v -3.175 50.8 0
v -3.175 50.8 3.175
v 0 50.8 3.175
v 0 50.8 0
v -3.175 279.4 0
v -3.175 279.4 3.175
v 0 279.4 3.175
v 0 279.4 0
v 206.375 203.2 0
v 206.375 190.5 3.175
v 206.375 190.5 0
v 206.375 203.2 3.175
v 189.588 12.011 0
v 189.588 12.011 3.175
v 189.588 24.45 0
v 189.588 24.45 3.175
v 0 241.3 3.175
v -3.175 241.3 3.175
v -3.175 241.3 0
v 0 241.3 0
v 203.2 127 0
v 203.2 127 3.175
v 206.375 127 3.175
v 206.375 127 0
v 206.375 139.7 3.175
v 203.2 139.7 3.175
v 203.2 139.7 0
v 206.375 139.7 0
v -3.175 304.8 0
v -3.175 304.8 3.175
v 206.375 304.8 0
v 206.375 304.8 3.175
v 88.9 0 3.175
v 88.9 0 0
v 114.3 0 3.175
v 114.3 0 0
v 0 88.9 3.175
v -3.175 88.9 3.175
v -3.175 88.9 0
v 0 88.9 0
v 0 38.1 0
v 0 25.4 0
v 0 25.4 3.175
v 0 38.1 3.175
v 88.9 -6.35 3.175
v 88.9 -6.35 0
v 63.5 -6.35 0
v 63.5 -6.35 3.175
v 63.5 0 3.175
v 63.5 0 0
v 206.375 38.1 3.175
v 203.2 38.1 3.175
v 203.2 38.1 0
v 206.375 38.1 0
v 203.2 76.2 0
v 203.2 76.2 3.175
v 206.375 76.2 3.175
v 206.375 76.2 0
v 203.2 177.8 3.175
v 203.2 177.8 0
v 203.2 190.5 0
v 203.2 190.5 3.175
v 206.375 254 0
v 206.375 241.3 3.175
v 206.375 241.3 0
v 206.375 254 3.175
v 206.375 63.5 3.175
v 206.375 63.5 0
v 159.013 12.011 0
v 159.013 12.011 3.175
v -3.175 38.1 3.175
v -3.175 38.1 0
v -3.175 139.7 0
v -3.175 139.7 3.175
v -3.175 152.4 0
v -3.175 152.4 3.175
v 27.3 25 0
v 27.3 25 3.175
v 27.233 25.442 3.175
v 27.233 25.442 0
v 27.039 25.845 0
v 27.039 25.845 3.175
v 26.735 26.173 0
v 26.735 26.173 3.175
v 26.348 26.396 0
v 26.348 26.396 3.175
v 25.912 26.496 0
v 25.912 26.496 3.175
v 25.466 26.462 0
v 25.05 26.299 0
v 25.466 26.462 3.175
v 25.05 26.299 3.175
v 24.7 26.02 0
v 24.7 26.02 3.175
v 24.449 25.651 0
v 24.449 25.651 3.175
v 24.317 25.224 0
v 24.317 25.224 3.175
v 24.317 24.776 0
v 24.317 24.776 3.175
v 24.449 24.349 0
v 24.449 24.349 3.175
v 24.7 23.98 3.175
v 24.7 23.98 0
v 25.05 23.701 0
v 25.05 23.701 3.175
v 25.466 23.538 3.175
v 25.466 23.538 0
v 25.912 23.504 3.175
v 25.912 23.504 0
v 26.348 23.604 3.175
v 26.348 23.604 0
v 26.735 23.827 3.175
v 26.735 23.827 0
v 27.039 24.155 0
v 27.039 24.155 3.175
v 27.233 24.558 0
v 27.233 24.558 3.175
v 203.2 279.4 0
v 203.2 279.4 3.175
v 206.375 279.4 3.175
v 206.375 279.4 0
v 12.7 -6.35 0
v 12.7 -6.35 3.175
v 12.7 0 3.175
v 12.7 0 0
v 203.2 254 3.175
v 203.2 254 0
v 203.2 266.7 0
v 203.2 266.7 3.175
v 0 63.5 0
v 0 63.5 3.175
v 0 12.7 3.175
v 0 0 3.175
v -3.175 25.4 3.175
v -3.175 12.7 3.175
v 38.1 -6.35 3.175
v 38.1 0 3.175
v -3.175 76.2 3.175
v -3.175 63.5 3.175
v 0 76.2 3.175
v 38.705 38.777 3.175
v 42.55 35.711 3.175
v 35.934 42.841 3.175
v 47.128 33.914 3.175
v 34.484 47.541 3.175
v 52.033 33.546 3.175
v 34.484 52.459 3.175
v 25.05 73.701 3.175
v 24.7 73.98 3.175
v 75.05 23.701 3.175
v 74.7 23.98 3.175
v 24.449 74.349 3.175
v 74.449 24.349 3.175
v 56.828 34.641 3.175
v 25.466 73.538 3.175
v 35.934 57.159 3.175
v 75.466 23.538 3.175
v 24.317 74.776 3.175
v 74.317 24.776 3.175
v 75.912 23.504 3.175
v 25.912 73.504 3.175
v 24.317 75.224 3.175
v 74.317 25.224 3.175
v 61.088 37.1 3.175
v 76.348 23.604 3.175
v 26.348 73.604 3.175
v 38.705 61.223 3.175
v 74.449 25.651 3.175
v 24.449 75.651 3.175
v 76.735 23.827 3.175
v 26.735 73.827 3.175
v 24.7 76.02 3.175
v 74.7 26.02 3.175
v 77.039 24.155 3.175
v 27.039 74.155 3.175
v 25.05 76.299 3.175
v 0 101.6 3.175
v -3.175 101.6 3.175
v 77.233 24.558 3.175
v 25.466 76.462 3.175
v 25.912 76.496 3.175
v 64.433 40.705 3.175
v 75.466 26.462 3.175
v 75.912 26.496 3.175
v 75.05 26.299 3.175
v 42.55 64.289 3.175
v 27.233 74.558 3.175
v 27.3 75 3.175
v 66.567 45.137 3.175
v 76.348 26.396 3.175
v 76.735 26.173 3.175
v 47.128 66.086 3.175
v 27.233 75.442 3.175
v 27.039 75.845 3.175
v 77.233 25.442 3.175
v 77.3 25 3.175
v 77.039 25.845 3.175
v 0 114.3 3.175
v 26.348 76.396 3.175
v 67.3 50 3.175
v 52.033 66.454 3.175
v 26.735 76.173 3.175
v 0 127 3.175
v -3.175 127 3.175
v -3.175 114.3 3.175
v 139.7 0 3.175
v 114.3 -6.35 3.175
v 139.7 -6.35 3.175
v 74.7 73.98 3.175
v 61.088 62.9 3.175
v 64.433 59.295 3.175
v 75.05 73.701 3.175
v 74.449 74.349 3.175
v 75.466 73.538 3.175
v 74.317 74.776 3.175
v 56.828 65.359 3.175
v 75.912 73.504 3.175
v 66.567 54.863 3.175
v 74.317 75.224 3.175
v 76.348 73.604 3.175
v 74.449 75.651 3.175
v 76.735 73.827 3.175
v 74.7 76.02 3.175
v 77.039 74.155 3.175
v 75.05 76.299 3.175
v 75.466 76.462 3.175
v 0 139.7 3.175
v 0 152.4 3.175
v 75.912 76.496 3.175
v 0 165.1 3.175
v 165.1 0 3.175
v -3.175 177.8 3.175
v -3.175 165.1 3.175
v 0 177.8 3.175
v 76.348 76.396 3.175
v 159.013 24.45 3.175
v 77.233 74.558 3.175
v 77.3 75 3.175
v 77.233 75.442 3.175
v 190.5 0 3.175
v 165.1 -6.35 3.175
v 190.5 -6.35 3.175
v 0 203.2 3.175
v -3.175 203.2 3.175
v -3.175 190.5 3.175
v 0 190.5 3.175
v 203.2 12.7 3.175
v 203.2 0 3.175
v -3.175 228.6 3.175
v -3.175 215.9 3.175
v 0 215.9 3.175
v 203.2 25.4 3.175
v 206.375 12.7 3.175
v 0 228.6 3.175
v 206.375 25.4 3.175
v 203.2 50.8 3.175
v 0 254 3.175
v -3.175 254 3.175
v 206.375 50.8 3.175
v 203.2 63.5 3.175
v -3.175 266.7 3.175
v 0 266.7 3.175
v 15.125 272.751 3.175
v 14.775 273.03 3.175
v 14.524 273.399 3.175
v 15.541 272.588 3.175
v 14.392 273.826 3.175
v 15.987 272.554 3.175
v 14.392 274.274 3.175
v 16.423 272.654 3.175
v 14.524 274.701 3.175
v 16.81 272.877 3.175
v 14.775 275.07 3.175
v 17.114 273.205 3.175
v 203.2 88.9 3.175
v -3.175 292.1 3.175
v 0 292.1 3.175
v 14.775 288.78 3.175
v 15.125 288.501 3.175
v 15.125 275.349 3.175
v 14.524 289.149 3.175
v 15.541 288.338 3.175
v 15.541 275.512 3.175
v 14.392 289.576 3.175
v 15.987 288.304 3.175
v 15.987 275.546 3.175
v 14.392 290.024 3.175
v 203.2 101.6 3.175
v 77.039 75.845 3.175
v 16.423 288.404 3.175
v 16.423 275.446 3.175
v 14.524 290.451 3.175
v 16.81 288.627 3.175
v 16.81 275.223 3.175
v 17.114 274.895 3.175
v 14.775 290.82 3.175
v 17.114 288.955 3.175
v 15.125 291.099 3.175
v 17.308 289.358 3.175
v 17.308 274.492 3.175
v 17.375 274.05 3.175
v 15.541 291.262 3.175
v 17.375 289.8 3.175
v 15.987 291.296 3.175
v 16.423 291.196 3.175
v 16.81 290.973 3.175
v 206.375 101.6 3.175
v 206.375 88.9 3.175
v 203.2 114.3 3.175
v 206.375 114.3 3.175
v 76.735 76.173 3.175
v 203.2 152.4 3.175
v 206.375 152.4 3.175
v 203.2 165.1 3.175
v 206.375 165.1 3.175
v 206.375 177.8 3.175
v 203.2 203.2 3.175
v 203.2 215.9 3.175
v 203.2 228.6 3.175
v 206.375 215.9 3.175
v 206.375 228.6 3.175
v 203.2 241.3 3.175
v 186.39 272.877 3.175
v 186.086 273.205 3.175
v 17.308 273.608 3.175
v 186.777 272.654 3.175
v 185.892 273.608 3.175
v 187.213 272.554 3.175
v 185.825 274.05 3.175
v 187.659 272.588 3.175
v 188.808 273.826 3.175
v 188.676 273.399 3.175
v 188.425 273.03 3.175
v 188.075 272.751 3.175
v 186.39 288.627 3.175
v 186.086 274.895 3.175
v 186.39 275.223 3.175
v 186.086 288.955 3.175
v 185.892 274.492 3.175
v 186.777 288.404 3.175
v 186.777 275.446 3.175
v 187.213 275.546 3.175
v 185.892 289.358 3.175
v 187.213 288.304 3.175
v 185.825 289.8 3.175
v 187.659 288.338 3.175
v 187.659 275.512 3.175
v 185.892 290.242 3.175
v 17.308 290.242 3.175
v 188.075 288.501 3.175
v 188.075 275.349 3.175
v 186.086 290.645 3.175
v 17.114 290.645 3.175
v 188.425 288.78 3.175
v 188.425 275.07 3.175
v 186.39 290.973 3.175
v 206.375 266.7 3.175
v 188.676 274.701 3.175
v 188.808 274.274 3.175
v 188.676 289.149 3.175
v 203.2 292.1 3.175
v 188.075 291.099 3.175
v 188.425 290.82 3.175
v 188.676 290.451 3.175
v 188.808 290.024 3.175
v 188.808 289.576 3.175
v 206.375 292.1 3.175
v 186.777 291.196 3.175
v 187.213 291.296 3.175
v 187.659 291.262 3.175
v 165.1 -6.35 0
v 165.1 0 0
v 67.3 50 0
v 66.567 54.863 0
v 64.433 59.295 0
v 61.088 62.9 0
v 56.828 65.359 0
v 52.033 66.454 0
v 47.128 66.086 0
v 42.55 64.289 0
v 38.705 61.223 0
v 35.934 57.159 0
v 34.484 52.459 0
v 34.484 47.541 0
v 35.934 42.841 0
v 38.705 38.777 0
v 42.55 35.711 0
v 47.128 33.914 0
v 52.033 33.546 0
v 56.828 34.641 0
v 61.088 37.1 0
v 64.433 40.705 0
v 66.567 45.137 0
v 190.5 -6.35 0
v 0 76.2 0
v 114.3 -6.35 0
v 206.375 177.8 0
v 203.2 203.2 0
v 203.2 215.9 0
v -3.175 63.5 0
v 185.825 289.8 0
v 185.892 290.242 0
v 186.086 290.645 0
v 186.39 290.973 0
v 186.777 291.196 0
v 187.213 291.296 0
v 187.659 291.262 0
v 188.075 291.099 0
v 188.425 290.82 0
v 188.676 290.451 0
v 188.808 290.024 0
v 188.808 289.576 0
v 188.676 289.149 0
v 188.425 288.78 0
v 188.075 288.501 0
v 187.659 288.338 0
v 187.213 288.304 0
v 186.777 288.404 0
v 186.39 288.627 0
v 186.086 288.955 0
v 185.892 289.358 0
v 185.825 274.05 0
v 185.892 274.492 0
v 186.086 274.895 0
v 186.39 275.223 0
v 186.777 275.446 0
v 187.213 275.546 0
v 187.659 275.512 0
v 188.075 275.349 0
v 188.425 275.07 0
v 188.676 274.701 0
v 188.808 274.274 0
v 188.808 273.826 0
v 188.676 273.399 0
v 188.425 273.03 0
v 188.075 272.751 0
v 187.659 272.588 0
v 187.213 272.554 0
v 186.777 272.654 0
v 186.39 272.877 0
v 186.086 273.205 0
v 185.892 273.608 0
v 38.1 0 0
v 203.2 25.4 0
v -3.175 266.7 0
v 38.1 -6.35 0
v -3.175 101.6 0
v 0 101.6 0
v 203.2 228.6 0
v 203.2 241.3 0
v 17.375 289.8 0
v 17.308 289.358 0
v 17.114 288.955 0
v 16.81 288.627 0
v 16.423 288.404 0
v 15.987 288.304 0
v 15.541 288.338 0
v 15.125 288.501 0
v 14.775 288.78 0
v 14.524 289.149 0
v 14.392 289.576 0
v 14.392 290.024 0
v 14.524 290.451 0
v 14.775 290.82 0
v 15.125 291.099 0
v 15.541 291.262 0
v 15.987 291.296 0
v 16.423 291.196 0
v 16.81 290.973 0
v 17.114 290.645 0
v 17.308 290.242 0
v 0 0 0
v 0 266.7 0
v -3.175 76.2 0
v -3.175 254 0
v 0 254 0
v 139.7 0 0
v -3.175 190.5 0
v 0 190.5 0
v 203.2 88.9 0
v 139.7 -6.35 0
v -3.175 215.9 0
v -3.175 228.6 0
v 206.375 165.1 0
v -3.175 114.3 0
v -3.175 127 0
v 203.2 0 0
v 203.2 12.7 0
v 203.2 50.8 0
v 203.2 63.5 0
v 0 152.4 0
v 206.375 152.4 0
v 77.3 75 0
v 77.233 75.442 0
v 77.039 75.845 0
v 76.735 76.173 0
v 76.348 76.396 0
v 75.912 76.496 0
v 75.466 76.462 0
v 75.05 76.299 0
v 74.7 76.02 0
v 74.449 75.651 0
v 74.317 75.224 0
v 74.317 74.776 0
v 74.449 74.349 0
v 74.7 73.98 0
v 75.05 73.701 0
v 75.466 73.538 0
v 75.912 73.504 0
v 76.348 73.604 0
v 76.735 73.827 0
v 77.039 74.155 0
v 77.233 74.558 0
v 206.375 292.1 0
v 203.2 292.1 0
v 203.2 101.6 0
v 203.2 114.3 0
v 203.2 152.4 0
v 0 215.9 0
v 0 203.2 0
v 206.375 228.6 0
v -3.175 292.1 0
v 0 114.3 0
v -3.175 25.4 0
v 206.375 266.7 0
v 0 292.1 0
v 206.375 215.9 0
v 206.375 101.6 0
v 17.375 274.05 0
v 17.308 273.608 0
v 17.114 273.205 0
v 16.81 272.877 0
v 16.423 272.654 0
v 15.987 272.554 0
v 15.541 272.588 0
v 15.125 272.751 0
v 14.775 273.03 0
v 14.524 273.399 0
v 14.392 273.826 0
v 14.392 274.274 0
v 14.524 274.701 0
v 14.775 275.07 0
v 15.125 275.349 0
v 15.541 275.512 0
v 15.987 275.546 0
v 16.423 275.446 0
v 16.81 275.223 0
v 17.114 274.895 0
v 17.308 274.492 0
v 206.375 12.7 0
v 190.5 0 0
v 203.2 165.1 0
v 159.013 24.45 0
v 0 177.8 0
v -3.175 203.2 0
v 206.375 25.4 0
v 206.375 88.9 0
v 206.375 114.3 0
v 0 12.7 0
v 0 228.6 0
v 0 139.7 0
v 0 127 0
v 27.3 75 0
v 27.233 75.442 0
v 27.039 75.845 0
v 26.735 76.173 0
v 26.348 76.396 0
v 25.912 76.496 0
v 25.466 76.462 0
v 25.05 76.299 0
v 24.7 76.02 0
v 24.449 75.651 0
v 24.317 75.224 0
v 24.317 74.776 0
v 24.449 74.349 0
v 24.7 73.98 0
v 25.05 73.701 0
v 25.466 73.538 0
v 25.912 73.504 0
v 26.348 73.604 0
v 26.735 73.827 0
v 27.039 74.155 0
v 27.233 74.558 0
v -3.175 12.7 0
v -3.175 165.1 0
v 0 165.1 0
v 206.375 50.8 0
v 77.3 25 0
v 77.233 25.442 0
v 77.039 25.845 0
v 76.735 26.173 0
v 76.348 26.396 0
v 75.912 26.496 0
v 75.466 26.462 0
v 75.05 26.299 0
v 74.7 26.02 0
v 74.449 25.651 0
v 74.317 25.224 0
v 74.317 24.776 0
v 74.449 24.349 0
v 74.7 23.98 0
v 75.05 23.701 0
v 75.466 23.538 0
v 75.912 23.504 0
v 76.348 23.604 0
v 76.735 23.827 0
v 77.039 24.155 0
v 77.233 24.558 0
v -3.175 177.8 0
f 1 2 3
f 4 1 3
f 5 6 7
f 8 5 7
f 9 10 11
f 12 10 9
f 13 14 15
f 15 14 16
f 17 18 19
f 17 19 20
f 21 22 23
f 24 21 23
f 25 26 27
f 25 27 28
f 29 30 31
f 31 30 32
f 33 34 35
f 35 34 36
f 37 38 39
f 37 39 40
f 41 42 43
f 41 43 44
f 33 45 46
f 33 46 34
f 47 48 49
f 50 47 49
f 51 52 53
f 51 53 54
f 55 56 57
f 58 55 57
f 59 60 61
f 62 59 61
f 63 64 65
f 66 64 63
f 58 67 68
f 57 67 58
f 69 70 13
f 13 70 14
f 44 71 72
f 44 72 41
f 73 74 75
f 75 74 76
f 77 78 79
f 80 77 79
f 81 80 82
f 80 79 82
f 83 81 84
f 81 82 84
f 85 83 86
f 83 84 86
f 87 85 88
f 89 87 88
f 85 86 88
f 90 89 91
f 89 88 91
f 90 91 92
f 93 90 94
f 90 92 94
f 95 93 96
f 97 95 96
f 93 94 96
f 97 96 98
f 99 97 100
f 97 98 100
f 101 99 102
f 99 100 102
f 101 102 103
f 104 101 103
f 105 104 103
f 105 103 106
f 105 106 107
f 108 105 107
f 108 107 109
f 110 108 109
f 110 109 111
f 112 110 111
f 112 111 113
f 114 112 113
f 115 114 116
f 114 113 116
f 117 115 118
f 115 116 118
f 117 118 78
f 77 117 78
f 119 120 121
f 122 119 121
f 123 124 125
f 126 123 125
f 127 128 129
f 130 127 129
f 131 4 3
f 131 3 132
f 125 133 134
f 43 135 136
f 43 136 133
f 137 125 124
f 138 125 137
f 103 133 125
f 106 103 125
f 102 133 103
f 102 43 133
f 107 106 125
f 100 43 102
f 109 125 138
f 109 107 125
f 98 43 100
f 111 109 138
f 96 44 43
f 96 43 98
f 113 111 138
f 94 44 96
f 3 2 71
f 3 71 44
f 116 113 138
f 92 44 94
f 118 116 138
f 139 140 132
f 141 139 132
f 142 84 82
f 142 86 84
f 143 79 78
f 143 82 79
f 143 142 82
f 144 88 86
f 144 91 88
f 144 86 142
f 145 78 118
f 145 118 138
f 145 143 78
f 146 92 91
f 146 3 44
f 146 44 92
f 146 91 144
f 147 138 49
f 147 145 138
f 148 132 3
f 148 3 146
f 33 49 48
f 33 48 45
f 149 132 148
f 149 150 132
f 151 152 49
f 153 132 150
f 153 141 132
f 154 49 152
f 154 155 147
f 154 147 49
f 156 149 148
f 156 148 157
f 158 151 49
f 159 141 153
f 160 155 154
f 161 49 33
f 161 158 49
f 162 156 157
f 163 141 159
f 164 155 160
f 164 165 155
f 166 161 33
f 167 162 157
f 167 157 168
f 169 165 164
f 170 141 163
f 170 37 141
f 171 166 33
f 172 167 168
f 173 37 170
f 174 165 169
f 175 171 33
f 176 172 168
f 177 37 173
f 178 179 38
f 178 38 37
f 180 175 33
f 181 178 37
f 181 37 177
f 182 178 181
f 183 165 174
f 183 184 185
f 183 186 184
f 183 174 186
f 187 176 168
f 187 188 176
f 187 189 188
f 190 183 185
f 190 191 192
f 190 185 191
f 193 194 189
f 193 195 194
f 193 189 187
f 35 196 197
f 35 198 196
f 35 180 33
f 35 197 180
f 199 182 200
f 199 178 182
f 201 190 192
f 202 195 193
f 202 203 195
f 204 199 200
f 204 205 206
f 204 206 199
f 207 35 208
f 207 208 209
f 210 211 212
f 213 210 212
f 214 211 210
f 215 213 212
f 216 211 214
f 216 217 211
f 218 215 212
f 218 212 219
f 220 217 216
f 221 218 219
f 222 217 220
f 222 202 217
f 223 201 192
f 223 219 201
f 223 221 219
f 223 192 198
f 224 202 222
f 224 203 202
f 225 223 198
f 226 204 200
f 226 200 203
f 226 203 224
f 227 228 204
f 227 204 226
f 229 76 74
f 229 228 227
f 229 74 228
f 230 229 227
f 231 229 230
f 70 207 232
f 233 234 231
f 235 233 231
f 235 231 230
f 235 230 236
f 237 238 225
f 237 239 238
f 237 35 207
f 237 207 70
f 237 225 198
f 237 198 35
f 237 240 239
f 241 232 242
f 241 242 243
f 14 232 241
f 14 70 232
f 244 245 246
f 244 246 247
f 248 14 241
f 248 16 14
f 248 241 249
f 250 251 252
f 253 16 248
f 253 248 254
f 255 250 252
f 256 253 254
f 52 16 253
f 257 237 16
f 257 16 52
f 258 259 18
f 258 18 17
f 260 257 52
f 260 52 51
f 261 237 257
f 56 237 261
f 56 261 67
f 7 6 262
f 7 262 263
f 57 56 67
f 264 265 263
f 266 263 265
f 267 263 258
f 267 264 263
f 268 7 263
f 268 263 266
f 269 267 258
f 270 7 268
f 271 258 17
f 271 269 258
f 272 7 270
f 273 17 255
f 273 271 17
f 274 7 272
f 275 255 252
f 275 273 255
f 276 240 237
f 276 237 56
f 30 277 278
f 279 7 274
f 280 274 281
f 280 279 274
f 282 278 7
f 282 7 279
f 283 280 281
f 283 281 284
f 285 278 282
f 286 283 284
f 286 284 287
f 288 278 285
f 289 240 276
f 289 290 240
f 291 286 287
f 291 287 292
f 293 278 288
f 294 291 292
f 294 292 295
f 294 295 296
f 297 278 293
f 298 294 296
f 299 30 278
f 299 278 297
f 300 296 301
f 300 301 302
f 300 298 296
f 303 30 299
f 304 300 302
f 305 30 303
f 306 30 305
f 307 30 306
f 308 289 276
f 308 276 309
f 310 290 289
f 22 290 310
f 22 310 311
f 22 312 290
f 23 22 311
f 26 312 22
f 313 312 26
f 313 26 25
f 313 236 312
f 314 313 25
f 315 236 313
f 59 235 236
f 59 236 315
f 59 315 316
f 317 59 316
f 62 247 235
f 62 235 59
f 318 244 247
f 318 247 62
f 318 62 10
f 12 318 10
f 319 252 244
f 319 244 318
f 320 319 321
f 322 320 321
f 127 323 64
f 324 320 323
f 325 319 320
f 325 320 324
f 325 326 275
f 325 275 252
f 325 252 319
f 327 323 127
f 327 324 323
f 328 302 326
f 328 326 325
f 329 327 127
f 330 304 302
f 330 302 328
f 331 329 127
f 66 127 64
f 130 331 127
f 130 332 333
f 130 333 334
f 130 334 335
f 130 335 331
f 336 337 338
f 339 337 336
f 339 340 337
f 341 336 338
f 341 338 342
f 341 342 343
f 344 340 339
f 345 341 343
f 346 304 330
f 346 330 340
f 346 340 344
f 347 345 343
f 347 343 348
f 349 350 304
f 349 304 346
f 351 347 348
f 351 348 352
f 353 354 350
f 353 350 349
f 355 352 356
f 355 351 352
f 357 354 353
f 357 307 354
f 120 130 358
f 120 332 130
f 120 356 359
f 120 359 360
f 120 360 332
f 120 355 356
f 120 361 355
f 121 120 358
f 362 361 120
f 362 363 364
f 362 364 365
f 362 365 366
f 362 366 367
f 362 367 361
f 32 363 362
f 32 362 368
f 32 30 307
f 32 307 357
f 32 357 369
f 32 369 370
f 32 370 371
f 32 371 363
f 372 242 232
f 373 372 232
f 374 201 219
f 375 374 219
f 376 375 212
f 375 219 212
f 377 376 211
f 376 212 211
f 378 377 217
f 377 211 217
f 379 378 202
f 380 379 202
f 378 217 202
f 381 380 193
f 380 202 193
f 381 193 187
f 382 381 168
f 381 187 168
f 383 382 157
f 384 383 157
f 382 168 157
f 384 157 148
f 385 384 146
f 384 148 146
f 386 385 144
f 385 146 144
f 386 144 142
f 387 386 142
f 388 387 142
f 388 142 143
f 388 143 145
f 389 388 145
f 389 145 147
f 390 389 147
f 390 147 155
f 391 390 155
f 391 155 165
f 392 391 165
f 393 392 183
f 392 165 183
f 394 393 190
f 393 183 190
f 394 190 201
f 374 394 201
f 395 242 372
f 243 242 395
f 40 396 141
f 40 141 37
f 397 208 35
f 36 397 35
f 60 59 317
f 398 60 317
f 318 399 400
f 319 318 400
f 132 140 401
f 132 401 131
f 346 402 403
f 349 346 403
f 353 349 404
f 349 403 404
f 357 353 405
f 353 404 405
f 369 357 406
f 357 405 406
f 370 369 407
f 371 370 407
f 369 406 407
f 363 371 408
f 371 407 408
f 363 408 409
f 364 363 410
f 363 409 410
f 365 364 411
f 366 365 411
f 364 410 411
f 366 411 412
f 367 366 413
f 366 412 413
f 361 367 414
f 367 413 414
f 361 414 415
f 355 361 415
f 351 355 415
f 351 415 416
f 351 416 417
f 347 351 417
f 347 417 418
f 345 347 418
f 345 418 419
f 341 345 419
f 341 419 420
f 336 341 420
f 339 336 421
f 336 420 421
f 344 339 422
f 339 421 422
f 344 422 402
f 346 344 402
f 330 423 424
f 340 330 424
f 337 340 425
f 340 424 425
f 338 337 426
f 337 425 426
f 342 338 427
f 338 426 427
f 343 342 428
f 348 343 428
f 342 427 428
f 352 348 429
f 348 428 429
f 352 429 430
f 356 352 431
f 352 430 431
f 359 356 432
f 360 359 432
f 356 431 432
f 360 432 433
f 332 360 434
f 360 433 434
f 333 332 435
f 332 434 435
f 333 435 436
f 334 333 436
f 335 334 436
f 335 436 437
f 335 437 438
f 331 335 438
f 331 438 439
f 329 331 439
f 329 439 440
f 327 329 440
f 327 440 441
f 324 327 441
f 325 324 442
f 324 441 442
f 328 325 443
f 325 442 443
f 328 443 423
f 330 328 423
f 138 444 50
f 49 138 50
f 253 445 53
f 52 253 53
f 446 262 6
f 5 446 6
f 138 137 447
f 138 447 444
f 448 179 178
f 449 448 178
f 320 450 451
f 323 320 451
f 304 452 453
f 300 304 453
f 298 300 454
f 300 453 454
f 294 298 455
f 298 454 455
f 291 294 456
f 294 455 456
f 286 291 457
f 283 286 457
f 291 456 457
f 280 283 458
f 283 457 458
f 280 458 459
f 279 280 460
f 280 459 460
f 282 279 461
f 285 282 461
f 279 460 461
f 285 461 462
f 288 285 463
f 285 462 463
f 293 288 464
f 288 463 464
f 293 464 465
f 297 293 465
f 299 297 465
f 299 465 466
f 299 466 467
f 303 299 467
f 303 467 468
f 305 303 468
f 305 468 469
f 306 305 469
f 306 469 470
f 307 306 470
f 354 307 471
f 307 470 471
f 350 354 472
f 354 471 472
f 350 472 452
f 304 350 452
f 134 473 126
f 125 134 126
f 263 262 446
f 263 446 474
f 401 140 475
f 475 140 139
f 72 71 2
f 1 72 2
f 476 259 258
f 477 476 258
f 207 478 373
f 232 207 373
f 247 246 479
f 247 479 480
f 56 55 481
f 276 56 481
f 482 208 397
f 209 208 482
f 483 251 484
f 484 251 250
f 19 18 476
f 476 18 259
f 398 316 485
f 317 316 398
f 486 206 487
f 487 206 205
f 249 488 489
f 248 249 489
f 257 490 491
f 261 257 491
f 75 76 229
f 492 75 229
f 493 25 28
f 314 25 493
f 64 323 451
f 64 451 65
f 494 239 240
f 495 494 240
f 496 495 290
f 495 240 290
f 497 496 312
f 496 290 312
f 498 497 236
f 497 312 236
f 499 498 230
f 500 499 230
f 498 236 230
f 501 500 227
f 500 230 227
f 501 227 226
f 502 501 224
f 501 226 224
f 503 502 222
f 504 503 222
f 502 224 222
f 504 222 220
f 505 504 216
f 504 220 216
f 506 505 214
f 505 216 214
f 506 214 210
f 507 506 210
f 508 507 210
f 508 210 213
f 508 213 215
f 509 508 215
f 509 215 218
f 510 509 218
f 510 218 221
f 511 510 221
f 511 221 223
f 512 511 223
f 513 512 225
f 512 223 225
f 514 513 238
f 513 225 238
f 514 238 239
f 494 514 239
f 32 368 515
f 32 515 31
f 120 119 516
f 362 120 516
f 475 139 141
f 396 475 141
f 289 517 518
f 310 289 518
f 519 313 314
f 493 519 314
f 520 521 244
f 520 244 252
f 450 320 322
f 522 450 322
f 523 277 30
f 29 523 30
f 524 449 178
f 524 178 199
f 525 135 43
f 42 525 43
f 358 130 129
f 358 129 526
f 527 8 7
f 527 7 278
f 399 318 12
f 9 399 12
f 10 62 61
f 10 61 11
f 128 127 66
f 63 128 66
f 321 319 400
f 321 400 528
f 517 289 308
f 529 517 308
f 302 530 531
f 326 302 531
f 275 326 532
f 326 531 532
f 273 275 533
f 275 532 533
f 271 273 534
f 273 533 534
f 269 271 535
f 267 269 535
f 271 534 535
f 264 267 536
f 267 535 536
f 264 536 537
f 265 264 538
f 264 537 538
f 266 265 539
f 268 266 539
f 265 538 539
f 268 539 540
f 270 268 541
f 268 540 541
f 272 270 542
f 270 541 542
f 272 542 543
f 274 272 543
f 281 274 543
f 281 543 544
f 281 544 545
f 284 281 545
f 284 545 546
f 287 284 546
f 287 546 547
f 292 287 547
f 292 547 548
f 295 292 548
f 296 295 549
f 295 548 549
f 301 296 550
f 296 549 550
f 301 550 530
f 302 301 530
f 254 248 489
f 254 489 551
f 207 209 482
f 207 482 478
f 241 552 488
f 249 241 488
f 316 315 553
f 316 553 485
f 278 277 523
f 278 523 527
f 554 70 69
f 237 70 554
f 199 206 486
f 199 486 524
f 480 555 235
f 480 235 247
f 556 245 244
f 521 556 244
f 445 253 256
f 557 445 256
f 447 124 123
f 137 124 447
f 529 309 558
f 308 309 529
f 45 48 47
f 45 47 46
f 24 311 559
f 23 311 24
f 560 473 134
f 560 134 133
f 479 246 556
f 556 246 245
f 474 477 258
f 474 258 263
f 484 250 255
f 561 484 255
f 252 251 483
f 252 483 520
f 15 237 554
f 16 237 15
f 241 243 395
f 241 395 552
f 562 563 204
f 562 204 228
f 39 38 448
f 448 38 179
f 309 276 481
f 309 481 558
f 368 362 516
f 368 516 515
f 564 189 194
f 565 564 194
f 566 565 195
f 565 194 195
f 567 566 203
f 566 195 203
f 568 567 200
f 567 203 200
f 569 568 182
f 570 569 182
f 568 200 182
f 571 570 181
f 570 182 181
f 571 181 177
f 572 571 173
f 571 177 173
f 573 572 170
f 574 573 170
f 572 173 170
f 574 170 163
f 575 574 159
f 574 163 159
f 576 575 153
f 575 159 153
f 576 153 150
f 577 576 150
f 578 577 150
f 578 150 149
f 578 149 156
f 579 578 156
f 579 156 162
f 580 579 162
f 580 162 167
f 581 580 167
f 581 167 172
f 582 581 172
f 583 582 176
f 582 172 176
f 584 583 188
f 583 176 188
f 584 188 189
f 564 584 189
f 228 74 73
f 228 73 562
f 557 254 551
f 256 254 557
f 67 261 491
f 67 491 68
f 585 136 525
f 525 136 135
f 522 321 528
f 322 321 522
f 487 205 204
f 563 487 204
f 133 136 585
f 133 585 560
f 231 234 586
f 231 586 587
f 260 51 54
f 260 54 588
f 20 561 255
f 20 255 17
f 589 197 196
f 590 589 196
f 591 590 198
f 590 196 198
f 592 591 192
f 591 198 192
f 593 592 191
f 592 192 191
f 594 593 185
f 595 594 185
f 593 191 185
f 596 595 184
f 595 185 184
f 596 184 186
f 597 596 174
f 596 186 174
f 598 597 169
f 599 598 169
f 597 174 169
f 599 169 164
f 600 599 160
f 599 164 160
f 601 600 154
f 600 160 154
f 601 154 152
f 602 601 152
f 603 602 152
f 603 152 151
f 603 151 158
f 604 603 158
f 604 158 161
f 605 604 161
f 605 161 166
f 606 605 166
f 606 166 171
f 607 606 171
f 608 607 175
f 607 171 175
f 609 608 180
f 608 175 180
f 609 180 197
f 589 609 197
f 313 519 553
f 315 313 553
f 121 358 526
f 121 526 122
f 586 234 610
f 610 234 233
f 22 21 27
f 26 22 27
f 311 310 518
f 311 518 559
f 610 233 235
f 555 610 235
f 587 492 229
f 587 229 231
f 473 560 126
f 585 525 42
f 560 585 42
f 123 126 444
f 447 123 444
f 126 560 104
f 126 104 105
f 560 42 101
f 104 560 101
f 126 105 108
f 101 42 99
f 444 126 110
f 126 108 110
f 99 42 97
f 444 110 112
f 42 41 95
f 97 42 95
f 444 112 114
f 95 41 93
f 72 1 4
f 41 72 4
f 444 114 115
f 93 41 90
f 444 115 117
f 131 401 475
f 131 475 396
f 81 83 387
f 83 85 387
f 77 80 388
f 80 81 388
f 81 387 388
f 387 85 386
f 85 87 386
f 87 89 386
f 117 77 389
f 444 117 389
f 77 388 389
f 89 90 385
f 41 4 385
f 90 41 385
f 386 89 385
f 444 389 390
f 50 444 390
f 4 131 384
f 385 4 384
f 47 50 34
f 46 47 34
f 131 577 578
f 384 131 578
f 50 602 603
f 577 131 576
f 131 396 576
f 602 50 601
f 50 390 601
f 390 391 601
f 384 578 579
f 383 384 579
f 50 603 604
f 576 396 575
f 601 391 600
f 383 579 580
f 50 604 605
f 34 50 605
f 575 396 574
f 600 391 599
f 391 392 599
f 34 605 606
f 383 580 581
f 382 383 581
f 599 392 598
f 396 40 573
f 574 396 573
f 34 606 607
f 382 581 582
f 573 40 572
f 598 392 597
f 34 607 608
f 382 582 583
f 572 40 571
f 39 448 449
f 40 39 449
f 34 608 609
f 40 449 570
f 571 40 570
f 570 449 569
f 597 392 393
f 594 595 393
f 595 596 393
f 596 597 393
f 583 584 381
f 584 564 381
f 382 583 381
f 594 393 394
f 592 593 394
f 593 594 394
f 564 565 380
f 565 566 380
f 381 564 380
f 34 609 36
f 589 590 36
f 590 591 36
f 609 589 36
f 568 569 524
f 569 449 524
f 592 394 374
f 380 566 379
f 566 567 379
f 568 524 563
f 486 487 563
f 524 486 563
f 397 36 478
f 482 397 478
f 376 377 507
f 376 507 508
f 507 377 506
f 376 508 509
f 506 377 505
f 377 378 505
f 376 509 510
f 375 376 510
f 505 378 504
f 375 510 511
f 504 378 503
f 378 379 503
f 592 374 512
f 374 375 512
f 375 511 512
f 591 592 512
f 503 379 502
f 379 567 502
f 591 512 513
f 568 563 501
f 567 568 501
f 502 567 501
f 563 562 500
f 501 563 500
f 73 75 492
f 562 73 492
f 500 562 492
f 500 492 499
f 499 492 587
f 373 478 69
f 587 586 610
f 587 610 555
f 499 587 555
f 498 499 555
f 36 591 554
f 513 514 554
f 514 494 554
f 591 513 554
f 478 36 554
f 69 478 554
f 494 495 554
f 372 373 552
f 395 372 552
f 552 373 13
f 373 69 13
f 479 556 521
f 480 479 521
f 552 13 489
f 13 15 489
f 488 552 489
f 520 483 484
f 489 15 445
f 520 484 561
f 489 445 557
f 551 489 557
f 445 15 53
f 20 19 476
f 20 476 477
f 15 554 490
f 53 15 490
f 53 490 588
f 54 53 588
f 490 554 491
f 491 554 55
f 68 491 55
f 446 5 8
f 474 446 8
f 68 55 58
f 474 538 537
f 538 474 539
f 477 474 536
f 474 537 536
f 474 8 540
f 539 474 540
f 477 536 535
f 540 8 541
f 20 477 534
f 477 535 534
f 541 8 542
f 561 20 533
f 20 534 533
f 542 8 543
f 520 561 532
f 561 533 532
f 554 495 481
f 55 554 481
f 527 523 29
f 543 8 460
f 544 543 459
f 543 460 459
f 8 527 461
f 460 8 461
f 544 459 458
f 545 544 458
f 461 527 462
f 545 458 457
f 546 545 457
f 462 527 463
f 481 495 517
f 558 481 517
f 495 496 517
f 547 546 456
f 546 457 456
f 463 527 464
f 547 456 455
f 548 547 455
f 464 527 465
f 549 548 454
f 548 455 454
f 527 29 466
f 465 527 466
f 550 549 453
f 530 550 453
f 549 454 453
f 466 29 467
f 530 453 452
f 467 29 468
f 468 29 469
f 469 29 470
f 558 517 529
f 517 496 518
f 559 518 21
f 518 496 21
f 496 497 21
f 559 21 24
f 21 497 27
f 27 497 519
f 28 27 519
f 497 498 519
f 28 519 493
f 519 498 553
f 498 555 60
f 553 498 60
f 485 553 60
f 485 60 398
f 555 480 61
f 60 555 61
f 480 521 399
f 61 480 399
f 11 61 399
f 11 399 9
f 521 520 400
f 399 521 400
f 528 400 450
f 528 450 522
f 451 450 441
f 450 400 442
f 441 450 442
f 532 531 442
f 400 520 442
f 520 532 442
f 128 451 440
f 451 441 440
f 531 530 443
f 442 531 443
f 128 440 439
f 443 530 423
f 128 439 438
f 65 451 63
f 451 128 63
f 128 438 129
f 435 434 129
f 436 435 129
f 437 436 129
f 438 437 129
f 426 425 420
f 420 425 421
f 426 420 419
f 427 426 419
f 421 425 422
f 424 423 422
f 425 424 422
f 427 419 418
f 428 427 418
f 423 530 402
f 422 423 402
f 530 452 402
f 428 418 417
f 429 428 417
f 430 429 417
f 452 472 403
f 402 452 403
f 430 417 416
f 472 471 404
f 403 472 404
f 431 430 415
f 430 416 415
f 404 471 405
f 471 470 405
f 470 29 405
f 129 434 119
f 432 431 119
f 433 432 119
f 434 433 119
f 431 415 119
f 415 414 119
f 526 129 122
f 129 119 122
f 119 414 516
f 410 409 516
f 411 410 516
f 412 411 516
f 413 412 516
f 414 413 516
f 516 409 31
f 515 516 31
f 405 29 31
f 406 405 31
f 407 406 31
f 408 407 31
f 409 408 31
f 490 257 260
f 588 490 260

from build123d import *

# Parameters (mm, degrees)
SKETCH1_W           = 203.2
SKETCH1_H           = 304.8
BOSS_EXTRUDE1_DEPTH = 3.175
SKETCH2_W           = 3.175
SKETCH2_H           = 12.7
SKETCH2_W_2         = 25.4
SKETCH2_H_2         = 6.35
BOSS_EXTRUDE2_DEPTH = 3.175
SKETCH4_R           = 16.5
SKETCH4_R_2         = 1.5
CUT_EXTRUDE1_DEPTH  = 3.175
SKETCH5_R           = 1.5
CUT_EXTRUDE2_DEPTH  = 3.175
SKETCH7_W           = 30.575
SKETCH7_H           = 12.439028
CUT_EXTRUDE4_DEPTH  = 3.175


with BuildPart() as part:
    # Sketch1 → Boss-Extrude1 (new body)
    with BuildSketch(Plane.XY):
        with Locations((101.6, 152.4)):
            Rectangle(SKETCH1_W, SKETCH1_H)
    extrude(amount=BOSS_EXTRUDE1_DEPTH)

    # Sketch2 → Boss-Extrude2 (add)
    with BuildSketch(Plane.XY.offset(3.175)):
        with Locations((-1.5875, 298.45)):
            Rectangle(SKETCH2_W, SKETCH2_H)
        with Locations((204.7875, 298.45)):
            Rectangle(SKETCH2_W, SKETCH2_H)
        with Locations((-1.5875, 273.05)):
            Rectangle(SKETCH2_W, SKETCH2_H)
        with Locations((204.7875, 273.05)):
            Rectangle(SKETCH2_W, SKETCH2_H)
        with Locations((-1.5875, 247.65)):
            Rectangle(SKETCH2_W, SKETCH2_H)
        with Locations((204.7875, 247.65)):
            Rectangle(SKETCH2_W, SKETCH2_H)
        with Locations((-1.5875, 222.25)):
            Rectangle(SKETCH2_W, SKETCH2_H)
        with Locations((204.7875, 222.25)):
            Rectangle(SKETCH2_W, SKETCH2_H)
        with Locations((-1.5875, 196.85)):
            Rectangle(SKETCH2_W, SKETCH2_H)
        with Locations((204.7875, 196.85)):
            Rectangle(SKETCH2_W, SKETCH2_H)
        with Locations((-1.5875, 171.45)):
            Rectangle(SKETCH2_W, SKETCH2_H)
        with Locations((204.7875, 171.45)):
            Rectangle(SKETCH2_W, SKETCH2_H)
        with Locations((-1.5875, 146.05)):
            Rectangle(SKETCH2_W, SKETCH2_H)
        with Locations((204.7875, 146.05)):
            Rectangle(SKETCH2_W, SKETCH2_H)
        with Locations((-1.5875, 120.65)):
            Rectangle(SKETCH2_W, SKETCH2_H)
        with Locations((204.7875, 120.65)):
            Rectangle(SKETCH2_W, SKETCH2_H)
        with Locations((-1.5875, 95.25)):
            Rectangle(SKETCH2_W, SKETCH2_H)
        with Locations((204.7875, 95.25)):
            Rectangle(SKETCH2_W, SKETCH2_H)
        with Locations((-1.5875, 69.85)):
            Rectangle(SKETCH2_W, SKETCH2_H)
        with Locations((204.7875, 69.85)):
            Rectangle(SKETCH2_W, SKETCH2_H)
        with Locations((-1.5875, 44.45)):
            Rectangle(SKETCH2_W, SKETCH2_H)
        with Locations((204.7875, 44.45)):
            Rectangle(SKETCH2_W, SKETCH2_H)
        with Locations((-1.5875, 19.05)):
            Rectangle(SKETCH2_W, SKETCH2_H)
        with Locations((204.7875, 19.05)):
            Rectangle(SKETCH2_W, SKETCH2_H)
        with Locations((25.4, -3.175)):
            Rectangle(SKETCH2_W_2, SKETCH2_H_2)
        with Locations((76.2, -3.175)):
            Rectangle(SKETCH2_W_2, SKETCH2_H_2)
        with Locations((127, -3.175)):
            Rectangle(SKETCH2_W_2, SKETCH2_H_2)
        with Locations((177.8, -3.175)):
            Rectangle(SKETCH2_W_2, SKETCH2_H_2)
    extrude(amount=-BOSS_EXTRUDE2_DEPTH)

    # Sketch4 → Cut-Extrude1 (cut)
    with BuildSketch(Plane.XY.offset(3.175)):
        with Locations((50.8, 50)):
            Circle(SKETCH4_R)
        with Locations((25.8, 75)):
            Circle(SKETCH4_R_2)
        with Locations((75.8, 75)):
            Circle(SKETCH4_R_2)
        with Locations((75.8, 25)):
            Circle(SKETCH4_R_2)
        with Locations((25.8, 25)):
            Circle(SKETCH4_R_2)
    extrude(amount=-CUT_EXTRUDE1_DEPTH, mode=Mode.SUBTRACT)

    # Sketch5 → Cut-Extrude2 (cut)
    with BuildSketch(Plane(origin=(0, 0, 0), x_dir=(-1, 0, 0), z_dir=(0, 0, -1))):
        with Locations((-187.325, 289.8)):
            Circle(SKETCH5_R)
        with Locations((-187.325, 274.05)):
            Circle(SKETCH5_R)
        with Locations(Location((-15.875, 274.05, 0), (0, 0, 180))):
            Circle(SKETCH5_R)
        with Locations(Location((-15.875, 289.8, 0), (0, 0, 180))):
            Circle(SKETCH5_R)
    extrude(amount=-CUT_EXTRUDE2_DEPTH, mode=Mode.SUBTRACT)

    # Sketch7 → Cut-Extrude4 (cut)
    with BuildSketch(Plane.XY.offset(3.175)):
        with Locations((174.3, 18.230486)):
            Rectangle(SKETCH7_W, SKETCH7_H)
    extrude(amount=-CUT_EXTRUDE4_DEPTH, mode=Mode.SUBTRACT)


solid = part.part
